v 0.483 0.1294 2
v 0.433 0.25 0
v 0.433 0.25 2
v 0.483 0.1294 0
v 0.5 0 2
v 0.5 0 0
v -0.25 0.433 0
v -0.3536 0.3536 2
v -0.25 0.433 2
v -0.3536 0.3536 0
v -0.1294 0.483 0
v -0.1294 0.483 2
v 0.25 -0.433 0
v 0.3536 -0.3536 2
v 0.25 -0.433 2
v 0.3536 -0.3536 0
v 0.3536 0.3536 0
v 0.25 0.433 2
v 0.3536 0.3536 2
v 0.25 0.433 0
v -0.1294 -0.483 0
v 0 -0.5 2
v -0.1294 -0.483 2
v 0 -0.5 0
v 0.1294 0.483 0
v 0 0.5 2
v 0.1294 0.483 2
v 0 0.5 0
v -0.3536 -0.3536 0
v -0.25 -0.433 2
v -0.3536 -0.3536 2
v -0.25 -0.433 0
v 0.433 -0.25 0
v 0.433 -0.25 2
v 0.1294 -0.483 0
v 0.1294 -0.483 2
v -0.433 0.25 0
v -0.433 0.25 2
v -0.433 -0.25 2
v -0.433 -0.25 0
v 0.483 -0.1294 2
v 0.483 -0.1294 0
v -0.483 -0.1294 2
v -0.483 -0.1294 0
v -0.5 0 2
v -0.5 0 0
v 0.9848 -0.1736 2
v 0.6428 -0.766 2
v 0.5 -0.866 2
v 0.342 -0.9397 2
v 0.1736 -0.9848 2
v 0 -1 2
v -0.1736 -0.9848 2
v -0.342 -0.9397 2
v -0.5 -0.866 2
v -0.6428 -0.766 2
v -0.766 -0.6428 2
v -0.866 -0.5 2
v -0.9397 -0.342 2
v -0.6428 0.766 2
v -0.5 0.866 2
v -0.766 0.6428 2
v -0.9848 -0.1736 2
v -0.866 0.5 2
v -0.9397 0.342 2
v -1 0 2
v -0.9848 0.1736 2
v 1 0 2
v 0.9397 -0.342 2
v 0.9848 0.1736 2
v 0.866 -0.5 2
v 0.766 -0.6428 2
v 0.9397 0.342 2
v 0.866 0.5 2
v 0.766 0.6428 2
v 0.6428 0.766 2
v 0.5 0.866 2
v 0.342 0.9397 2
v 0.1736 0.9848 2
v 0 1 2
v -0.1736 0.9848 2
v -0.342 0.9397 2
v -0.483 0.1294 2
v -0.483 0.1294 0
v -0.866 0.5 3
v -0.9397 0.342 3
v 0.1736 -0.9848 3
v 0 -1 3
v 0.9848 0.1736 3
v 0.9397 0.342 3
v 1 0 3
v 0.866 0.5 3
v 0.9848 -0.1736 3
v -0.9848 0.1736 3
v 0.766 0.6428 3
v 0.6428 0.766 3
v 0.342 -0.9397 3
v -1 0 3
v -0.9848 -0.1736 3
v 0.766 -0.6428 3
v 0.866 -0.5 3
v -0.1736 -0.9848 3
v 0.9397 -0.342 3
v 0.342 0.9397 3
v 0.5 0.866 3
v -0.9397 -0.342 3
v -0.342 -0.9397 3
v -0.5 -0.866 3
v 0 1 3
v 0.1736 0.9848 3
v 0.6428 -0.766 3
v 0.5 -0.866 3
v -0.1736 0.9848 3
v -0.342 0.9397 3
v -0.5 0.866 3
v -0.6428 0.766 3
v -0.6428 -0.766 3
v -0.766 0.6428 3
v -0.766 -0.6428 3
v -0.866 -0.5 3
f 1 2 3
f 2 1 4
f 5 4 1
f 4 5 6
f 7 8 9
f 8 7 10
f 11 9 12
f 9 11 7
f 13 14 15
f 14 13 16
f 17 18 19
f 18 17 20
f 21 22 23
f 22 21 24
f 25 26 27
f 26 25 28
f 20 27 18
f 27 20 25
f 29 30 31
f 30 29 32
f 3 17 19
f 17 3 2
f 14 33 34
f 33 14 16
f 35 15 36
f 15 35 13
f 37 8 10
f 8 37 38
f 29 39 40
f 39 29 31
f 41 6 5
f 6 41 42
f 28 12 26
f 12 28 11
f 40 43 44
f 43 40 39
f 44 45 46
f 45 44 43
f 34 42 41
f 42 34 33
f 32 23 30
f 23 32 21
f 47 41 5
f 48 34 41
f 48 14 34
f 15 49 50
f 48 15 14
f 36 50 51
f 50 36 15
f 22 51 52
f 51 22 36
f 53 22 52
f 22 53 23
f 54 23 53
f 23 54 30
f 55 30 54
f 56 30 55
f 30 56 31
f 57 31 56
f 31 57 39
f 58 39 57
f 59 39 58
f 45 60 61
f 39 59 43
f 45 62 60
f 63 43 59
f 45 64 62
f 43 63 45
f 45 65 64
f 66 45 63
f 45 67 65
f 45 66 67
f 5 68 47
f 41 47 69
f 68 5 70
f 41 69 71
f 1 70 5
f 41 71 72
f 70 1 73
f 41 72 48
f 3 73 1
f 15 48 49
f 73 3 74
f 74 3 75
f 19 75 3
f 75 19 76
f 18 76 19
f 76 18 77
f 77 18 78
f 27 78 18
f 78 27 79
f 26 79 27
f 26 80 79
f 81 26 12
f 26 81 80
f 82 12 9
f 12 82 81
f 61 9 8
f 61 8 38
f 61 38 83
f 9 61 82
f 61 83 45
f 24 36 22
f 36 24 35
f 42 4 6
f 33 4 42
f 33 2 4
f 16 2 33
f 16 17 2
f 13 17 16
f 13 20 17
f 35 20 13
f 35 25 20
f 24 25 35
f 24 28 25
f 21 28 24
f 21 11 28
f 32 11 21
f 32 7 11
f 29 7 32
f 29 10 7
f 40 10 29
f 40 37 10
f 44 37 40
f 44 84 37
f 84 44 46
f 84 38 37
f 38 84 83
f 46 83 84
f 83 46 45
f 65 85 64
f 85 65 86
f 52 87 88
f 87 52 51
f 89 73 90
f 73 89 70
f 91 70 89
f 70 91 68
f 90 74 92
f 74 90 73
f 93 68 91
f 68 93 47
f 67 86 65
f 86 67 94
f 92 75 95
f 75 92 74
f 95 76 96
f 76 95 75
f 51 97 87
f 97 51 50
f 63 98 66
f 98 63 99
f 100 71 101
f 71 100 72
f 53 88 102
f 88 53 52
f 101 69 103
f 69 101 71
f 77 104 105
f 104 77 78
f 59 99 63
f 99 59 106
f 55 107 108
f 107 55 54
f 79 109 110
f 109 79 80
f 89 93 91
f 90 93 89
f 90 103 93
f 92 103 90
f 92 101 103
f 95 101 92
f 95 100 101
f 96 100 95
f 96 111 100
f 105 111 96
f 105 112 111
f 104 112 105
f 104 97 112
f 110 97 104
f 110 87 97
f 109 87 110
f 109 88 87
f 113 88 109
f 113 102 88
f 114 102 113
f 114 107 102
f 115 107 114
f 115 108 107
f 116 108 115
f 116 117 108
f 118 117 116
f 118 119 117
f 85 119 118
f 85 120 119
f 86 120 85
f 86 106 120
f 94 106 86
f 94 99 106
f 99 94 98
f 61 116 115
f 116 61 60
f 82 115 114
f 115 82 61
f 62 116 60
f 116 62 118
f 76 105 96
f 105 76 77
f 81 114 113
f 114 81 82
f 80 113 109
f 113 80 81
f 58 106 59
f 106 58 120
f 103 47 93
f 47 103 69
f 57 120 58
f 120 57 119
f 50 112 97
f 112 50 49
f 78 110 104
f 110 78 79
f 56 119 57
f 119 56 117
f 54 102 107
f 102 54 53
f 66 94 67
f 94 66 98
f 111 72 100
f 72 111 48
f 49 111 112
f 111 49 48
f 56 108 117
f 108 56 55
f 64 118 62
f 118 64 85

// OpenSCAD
// part_id: cp3
// name: Pointer slip-ring rivet
// source_drawing_ids: DRW-005
// units: mm
// revision: 0.1
// SPDX-License-Identifier: MIT

module part_cp3(pin_d = 1.0, pin_h = 2.0, head_d = 2.0, head_h = 1.0) {
    union() {
        cylinder(d = pin_d, h = pin_h, center = false, $fn = 24);
        translate([0, 0, pin_h]) cylinder(d = head_d, h = head_h, center = false, $fn = 36);
    }
}

// ---- "main guard" ----
// Default to previewing when opened directly:
if (is_undef(__LIB_MODE__)) {
    part_cp3();
}
